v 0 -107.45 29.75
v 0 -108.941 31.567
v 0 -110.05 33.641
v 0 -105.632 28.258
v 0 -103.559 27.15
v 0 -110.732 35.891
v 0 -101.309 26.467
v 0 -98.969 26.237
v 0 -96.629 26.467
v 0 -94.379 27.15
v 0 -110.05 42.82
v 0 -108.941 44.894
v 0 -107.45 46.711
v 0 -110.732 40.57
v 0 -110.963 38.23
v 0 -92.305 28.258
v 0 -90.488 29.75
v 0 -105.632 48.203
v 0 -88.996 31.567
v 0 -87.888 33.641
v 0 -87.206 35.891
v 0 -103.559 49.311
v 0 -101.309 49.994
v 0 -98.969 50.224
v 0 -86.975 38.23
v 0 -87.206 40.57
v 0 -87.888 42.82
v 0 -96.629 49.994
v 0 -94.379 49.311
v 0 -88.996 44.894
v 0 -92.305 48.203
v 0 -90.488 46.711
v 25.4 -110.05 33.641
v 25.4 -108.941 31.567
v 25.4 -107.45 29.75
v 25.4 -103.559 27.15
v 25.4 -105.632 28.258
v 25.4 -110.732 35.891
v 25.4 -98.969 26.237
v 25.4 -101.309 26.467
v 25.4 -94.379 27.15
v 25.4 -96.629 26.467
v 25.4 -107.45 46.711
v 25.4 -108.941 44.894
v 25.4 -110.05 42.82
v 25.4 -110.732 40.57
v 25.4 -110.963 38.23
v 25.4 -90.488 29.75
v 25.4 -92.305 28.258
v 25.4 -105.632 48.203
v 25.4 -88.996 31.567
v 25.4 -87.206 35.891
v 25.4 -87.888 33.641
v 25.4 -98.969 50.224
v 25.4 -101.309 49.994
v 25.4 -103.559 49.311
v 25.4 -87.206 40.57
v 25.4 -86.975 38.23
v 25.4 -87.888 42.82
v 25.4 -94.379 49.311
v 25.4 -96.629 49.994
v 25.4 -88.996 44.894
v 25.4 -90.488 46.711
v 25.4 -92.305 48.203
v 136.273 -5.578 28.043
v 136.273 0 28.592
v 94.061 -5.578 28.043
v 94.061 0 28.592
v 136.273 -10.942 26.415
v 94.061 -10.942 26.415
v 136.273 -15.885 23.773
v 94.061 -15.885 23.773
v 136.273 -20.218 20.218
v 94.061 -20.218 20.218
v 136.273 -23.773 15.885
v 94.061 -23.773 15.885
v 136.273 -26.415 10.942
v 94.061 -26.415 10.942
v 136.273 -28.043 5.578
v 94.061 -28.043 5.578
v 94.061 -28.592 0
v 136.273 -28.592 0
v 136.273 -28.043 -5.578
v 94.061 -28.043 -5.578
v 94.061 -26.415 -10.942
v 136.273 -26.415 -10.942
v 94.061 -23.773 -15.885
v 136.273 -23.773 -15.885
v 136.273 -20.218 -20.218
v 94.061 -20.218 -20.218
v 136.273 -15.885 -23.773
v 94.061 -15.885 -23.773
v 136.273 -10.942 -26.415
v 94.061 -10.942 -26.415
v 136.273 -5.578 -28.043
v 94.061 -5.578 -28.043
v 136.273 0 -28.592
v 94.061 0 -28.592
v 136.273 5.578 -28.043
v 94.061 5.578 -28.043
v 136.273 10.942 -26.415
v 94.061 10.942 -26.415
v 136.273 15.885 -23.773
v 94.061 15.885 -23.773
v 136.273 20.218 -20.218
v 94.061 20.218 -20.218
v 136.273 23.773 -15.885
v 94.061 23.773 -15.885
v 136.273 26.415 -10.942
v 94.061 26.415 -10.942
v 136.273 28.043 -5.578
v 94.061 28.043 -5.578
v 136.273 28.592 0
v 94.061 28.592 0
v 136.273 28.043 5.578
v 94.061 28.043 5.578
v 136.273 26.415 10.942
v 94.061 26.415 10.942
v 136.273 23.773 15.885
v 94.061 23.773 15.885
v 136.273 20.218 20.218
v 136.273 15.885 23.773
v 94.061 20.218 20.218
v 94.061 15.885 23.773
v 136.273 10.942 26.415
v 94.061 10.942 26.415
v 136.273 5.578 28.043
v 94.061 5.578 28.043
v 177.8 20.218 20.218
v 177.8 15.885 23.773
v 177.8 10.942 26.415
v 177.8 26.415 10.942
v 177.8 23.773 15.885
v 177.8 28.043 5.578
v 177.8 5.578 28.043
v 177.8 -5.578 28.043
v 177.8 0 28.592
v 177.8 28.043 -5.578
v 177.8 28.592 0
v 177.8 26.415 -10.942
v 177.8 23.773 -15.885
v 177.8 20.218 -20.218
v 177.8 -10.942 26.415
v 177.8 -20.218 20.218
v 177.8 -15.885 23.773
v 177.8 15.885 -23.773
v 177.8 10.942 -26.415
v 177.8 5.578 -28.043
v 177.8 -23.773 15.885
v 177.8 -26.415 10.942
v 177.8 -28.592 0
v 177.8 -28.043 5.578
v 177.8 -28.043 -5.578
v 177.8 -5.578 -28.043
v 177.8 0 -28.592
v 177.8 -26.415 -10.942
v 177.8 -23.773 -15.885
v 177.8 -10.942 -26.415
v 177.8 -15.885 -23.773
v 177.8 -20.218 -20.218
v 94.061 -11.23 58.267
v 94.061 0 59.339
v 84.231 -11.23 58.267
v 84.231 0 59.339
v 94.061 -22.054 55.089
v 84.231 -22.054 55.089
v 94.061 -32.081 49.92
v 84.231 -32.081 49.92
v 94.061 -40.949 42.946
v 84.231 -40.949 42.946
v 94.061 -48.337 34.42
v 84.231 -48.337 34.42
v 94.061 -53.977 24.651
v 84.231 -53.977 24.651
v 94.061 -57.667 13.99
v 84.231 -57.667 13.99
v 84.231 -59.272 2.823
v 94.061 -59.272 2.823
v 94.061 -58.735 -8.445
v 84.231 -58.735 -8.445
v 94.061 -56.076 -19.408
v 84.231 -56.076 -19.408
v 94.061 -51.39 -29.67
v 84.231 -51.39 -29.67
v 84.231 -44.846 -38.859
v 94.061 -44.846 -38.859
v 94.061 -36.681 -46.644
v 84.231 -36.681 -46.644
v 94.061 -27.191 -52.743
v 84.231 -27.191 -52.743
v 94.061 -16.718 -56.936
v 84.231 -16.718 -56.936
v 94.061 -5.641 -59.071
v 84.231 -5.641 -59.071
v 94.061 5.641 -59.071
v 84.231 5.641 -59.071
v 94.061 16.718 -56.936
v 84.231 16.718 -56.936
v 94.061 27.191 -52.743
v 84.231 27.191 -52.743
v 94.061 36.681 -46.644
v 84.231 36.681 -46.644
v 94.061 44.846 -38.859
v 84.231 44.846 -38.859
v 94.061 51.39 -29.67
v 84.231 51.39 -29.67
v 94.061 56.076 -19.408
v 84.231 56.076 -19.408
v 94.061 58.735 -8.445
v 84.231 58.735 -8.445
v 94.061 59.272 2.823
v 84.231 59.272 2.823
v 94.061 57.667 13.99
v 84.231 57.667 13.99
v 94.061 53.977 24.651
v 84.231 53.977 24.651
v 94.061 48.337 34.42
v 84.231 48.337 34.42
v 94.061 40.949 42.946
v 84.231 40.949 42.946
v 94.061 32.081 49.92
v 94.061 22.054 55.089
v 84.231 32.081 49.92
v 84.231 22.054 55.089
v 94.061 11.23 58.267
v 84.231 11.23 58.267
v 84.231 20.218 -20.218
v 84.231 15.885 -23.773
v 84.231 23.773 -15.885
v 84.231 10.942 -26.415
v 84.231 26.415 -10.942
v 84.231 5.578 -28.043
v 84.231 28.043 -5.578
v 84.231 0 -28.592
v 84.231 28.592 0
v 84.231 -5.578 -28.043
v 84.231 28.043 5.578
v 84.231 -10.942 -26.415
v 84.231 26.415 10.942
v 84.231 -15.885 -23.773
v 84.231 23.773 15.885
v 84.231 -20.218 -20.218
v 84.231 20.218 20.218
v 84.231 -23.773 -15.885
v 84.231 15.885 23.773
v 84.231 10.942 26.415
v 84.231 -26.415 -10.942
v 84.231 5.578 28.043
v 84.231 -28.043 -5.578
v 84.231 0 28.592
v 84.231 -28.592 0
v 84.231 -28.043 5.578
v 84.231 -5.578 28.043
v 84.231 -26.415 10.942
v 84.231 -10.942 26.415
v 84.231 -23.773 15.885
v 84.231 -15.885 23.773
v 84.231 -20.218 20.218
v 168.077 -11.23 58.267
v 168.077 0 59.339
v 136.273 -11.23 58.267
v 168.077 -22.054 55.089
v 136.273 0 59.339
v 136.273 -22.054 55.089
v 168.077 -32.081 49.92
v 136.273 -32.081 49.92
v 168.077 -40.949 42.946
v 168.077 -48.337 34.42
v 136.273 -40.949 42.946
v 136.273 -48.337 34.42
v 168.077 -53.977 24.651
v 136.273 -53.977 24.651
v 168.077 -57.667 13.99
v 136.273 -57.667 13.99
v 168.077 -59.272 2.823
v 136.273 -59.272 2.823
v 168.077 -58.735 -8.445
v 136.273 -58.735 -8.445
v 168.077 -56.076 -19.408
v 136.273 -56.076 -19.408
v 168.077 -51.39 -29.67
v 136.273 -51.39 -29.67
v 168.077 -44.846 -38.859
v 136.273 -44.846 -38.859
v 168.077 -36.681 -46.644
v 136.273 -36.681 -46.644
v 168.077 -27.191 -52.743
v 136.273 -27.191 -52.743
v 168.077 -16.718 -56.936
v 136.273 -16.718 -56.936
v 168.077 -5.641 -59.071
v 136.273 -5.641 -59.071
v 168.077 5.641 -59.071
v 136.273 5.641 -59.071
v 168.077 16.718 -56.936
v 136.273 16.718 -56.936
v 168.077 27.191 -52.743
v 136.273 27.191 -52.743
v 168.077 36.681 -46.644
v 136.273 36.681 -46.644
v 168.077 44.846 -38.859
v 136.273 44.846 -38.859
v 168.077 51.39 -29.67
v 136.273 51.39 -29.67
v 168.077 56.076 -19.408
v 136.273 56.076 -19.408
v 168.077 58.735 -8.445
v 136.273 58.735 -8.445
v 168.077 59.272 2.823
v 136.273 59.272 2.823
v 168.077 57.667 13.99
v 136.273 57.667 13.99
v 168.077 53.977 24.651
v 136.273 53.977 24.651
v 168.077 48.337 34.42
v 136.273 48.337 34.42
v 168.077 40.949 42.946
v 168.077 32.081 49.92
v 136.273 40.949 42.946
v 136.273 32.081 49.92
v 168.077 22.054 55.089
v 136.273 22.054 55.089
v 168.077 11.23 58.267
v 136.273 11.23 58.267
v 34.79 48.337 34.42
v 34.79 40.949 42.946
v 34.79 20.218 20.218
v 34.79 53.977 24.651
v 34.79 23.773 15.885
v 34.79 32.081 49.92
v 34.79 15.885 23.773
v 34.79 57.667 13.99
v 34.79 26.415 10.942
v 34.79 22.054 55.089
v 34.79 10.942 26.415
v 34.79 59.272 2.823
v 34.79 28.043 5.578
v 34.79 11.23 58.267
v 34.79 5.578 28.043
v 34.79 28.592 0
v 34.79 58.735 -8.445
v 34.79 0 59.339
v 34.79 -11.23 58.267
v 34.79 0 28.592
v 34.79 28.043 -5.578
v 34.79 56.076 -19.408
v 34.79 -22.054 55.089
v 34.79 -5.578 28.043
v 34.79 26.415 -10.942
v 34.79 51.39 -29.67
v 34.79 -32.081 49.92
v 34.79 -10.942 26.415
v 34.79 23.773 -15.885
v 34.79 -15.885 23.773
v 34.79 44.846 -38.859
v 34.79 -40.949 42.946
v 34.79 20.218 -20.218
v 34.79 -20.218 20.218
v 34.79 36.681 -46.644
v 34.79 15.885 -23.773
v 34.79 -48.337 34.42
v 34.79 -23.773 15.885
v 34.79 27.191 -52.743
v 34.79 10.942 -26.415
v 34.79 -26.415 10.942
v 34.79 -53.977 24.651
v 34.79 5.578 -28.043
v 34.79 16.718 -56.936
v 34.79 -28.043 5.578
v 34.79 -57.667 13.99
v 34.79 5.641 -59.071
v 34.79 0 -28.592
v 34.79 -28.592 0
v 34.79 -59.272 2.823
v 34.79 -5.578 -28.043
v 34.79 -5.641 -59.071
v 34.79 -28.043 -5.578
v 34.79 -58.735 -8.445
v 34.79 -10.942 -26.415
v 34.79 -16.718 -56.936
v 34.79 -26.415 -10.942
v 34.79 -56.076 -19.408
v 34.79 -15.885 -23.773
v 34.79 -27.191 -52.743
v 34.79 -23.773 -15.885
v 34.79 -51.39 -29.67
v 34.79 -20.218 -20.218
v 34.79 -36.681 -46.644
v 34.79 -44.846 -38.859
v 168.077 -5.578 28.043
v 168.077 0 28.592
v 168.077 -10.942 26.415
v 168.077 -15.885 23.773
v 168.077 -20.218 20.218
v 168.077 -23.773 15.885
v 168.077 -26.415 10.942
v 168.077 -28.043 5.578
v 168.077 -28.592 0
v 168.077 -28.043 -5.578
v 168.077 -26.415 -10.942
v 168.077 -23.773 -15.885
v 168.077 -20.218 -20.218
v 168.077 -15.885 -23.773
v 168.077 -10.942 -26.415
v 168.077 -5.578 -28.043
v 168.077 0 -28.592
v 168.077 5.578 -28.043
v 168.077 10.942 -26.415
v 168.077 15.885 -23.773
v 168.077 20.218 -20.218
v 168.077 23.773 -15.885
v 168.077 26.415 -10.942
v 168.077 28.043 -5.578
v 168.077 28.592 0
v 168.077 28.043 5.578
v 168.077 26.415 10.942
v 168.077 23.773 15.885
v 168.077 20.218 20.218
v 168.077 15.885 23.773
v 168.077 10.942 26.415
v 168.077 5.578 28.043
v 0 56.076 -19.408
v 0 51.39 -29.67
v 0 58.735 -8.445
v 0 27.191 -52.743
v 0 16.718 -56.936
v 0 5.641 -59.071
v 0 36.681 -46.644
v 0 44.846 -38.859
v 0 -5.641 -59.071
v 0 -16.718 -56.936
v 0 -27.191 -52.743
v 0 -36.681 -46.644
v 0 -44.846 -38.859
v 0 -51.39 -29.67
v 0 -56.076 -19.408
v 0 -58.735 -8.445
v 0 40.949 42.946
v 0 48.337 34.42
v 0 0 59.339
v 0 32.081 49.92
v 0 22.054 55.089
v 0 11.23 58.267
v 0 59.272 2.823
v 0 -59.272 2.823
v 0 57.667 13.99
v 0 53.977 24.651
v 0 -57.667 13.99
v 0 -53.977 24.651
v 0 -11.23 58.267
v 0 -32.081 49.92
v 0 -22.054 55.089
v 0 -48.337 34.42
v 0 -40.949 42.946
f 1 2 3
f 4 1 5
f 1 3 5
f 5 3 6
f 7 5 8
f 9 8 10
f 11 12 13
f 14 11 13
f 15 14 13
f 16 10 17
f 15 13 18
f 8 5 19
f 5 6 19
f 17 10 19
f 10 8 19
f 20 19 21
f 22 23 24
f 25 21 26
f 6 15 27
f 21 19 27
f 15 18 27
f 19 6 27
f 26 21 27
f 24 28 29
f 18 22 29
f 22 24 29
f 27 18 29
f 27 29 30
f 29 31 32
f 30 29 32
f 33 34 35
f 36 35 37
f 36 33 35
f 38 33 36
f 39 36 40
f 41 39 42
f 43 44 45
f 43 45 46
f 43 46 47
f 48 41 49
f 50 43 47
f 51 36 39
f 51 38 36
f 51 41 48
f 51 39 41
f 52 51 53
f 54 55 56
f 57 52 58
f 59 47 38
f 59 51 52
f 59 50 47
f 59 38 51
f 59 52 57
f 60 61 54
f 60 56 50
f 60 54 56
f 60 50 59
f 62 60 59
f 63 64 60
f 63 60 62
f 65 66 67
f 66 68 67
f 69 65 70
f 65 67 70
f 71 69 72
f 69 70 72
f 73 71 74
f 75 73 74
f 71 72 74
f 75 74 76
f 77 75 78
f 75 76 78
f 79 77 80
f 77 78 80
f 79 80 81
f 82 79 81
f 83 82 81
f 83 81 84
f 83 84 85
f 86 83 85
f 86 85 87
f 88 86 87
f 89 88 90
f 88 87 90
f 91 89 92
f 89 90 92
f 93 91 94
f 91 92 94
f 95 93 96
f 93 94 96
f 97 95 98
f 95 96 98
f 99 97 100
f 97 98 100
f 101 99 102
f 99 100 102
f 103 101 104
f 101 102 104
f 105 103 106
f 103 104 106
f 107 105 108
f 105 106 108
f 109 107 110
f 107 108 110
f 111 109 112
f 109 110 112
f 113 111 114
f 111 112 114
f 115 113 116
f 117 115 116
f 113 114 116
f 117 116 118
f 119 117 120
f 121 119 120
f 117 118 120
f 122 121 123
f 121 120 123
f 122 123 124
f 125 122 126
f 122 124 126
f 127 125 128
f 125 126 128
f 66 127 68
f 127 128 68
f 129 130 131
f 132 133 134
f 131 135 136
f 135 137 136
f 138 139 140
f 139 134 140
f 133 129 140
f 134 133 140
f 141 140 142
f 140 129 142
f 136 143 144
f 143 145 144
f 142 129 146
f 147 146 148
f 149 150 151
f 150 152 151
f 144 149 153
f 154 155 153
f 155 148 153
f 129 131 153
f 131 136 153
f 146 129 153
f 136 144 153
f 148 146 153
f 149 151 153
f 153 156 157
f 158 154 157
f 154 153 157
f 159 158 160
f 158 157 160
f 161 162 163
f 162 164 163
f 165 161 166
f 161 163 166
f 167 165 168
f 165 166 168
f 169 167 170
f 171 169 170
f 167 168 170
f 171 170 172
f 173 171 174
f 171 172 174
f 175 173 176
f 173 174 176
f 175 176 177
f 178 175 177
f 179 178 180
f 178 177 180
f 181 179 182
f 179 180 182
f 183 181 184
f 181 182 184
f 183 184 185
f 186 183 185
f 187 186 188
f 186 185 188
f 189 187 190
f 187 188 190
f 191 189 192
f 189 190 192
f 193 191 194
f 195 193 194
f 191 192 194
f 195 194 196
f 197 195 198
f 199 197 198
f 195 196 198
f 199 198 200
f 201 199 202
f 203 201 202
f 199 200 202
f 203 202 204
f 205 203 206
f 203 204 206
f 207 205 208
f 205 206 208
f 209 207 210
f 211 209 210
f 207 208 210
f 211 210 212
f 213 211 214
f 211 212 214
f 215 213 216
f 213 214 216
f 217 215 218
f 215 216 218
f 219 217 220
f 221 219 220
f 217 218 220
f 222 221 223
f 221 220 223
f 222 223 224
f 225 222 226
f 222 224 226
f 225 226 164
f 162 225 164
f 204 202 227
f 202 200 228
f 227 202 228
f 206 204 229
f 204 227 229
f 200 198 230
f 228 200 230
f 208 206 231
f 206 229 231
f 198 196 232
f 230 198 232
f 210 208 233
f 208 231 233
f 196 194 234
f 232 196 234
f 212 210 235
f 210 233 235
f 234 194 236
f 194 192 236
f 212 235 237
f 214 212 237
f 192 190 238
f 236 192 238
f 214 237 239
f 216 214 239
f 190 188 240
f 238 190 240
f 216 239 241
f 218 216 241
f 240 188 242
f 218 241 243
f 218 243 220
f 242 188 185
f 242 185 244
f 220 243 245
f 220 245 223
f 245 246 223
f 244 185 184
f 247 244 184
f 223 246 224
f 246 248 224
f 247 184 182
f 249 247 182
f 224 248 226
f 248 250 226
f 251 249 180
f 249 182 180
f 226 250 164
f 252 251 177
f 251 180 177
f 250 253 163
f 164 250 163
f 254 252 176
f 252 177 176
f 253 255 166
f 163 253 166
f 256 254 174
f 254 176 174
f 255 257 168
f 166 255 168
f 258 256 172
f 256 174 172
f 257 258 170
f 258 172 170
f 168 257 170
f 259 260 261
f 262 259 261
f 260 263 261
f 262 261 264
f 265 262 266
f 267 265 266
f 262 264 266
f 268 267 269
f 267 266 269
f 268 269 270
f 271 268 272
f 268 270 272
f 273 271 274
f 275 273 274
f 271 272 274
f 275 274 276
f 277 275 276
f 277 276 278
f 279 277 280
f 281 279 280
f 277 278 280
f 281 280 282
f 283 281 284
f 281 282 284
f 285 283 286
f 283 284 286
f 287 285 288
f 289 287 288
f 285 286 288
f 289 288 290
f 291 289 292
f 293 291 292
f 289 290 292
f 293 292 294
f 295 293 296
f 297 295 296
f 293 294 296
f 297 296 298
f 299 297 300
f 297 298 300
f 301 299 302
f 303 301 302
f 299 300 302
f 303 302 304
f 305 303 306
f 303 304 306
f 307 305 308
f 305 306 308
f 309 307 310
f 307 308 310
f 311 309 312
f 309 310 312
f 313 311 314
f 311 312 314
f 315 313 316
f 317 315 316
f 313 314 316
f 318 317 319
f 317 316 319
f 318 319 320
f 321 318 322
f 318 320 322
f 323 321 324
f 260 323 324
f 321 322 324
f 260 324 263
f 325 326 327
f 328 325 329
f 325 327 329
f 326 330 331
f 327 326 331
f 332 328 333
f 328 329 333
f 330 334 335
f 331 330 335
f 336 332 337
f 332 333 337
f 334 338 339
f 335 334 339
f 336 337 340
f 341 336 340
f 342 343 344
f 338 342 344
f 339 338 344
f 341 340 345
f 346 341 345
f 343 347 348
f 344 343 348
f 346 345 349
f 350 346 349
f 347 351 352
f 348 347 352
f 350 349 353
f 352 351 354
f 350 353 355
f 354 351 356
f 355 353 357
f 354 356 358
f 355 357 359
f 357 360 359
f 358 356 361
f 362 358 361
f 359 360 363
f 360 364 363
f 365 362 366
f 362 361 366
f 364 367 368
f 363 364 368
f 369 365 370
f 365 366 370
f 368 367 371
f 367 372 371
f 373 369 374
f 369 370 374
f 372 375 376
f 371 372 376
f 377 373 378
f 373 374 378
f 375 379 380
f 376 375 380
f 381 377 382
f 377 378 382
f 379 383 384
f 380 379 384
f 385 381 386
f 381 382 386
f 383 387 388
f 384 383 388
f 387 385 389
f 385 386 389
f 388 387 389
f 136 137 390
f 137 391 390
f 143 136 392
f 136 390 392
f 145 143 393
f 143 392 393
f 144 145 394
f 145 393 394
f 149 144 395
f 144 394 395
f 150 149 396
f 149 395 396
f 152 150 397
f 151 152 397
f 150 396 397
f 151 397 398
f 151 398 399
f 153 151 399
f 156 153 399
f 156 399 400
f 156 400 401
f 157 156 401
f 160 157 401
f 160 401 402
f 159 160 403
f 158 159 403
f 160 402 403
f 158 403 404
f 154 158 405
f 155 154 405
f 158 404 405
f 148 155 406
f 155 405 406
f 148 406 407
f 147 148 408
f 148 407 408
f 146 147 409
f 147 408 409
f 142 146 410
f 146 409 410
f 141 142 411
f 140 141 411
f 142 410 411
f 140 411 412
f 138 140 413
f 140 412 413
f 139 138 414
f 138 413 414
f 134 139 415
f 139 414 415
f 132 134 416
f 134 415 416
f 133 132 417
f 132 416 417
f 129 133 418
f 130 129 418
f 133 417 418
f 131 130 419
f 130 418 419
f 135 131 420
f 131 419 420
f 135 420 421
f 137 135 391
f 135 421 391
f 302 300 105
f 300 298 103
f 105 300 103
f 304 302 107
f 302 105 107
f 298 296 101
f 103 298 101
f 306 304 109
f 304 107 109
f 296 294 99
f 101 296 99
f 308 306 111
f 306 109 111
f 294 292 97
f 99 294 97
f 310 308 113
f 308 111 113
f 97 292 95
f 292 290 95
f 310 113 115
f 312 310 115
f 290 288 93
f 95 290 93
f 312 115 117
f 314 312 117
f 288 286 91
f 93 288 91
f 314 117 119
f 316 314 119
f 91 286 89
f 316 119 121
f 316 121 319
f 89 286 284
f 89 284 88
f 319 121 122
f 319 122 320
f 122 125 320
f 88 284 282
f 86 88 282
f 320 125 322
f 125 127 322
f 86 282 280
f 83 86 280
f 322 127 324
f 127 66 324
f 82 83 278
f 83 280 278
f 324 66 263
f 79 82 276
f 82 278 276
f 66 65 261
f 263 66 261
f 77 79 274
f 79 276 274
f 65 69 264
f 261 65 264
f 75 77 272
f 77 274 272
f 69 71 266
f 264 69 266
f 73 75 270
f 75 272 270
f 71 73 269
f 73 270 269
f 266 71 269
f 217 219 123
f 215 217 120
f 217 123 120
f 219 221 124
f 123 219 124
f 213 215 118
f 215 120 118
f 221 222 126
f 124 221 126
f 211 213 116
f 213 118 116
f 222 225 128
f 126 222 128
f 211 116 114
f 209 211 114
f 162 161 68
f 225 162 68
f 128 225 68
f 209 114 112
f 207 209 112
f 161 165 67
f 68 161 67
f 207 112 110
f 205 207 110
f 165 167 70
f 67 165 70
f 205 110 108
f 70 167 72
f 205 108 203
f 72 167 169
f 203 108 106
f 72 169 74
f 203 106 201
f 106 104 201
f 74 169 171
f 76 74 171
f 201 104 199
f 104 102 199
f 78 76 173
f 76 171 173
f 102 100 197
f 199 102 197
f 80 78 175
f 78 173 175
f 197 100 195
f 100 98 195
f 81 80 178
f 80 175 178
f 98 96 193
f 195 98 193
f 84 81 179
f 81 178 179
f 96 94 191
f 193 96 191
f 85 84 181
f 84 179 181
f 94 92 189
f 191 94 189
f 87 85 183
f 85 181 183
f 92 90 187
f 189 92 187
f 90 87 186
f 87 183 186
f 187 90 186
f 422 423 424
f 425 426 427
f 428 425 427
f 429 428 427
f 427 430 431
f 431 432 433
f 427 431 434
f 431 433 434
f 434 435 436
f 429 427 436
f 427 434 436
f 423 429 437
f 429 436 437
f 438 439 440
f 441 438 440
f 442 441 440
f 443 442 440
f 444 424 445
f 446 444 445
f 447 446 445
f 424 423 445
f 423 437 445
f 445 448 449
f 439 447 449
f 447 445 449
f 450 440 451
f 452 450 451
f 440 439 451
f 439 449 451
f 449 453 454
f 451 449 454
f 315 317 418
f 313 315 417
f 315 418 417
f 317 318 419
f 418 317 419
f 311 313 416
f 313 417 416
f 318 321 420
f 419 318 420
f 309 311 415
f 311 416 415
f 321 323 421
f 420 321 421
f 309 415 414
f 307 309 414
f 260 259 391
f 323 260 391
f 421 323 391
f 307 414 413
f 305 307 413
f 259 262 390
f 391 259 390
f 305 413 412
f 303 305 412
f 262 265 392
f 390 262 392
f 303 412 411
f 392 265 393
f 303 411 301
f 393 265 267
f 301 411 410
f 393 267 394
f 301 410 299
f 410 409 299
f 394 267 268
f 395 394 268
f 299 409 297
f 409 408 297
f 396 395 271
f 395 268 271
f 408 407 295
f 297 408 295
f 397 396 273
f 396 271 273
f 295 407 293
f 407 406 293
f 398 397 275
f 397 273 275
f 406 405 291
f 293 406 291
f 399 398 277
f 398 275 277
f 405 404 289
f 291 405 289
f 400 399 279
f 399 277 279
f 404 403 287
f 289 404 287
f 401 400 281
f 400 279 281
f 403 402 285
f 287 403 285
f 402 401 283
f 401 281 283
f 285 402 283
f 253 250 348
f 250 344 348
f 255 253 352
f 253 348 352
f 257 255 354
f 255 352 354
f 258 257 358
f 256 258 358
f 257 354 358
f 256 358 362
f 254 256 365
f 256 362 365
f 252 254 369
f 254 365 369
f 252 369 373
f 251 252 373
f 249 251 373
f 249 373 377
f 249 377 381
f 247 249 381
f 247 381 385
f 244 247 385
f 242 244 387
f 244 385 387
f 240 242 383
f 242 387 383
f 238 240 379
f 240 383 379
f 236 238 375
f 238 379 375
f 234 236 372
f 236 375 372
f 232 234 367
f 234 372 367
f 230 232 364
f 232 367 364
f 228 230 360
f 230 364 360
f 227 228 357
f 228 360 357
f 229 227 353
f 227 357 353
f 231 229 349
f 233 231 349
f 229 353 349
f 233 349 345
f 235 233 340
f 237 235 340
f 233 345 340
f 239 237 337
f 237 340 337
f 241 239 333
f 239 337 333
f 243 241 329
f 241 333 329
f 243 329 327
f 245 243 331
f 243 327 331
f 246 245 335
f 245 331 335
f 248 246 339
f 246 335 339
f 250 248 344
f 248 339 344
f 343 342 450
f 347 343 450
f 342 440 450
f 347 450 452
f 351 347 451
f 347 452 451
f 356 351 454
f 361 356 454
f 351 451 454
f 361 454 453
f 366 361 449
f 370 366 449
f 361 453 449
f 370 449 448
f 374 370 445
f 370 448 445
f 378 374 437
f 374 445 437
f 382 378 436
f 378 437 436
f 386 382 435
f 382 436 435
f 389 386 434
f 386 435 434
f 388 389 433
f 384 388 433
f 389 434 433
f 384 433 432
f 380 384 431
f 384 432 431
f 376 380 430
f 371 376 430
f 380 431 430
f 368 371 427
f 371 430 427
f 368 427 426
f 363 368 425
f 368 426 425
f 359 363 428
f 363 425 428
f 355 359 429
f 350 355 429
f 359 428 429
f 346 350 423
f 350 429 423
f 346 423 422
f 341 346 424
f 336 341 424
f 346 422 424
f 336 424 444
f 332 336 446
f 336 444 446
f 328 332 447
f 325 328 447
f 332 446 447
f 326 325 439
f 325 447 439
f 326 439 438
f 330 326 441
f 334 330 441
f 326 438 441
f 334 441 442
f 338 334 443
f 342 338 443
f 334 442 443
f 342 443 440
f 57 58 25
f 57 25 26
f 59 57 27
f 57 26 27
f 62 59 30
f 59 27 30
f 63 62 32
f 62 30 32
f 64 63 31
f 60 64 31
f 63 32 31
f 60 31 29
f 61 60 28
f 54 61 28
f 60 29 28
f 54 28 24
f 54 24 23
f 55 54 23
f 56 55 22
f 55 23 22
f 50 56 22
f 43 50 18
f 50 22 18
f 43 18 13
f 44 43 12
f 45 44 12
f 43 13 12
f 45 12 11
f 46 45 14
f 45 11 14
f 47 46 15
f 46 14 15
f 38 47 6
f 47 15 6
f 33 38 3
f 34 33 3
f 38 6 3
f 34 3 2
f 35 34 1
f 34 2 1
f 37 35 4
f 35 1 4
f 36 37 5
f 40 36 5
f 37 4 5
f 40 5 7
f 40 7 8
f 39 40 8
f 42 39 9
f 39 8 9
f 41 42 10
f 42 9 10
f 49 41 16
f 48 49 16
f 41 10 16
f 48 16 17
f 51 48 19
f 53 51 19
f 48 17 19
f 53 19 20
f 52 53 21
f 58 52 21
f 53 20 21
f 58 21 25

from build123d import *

# Parameters (mm, degrees)
F0_R     = 12.7
F1_DEPTH = 177.8
F4_R     = 11.993889
F5_DEPTH = 25.4


with BuildPart() as f1:
    # F0 (on Right) → F1 (new body)
    with BuildSketch(Plane.YZ):
        Circle(F0_R)
    extrude(amount=F1_DEPTH)

    # F2 (on Front) → F3 (revolve)
    with BuildSketch(Plane.XZ):
        Polygon((0, 59.33949), (0, 12.682171), (177.8, 12.682171), (177.8, 28.591886), (168.076825, 28.591886), (168.076825, 59.33949), (136.273128, 59.33949), (136.273128, 28.591886), (94.060932, 28.591886), (94.060932, 59.33949), (84.230696, 59.33949), (84.230696, 28.591886), (62.192257, 28.591886), (34.790394, 28.591886), (34.790394, 59.33949), align=None)
    revolve(axis=Axis((88.9, 0, 0), (1, 0, 0)))


with BuildPart() as f5:
    # F4 (on Right) → F5 (new body)
    with BuildSketch(Plane.YZ):
        with Locations((-98.968931, 38.230471)):
            Circle(F4_R)
    extrude(amount=F5_DEPTH)


solid = Compound([f1.part, f5.part])
